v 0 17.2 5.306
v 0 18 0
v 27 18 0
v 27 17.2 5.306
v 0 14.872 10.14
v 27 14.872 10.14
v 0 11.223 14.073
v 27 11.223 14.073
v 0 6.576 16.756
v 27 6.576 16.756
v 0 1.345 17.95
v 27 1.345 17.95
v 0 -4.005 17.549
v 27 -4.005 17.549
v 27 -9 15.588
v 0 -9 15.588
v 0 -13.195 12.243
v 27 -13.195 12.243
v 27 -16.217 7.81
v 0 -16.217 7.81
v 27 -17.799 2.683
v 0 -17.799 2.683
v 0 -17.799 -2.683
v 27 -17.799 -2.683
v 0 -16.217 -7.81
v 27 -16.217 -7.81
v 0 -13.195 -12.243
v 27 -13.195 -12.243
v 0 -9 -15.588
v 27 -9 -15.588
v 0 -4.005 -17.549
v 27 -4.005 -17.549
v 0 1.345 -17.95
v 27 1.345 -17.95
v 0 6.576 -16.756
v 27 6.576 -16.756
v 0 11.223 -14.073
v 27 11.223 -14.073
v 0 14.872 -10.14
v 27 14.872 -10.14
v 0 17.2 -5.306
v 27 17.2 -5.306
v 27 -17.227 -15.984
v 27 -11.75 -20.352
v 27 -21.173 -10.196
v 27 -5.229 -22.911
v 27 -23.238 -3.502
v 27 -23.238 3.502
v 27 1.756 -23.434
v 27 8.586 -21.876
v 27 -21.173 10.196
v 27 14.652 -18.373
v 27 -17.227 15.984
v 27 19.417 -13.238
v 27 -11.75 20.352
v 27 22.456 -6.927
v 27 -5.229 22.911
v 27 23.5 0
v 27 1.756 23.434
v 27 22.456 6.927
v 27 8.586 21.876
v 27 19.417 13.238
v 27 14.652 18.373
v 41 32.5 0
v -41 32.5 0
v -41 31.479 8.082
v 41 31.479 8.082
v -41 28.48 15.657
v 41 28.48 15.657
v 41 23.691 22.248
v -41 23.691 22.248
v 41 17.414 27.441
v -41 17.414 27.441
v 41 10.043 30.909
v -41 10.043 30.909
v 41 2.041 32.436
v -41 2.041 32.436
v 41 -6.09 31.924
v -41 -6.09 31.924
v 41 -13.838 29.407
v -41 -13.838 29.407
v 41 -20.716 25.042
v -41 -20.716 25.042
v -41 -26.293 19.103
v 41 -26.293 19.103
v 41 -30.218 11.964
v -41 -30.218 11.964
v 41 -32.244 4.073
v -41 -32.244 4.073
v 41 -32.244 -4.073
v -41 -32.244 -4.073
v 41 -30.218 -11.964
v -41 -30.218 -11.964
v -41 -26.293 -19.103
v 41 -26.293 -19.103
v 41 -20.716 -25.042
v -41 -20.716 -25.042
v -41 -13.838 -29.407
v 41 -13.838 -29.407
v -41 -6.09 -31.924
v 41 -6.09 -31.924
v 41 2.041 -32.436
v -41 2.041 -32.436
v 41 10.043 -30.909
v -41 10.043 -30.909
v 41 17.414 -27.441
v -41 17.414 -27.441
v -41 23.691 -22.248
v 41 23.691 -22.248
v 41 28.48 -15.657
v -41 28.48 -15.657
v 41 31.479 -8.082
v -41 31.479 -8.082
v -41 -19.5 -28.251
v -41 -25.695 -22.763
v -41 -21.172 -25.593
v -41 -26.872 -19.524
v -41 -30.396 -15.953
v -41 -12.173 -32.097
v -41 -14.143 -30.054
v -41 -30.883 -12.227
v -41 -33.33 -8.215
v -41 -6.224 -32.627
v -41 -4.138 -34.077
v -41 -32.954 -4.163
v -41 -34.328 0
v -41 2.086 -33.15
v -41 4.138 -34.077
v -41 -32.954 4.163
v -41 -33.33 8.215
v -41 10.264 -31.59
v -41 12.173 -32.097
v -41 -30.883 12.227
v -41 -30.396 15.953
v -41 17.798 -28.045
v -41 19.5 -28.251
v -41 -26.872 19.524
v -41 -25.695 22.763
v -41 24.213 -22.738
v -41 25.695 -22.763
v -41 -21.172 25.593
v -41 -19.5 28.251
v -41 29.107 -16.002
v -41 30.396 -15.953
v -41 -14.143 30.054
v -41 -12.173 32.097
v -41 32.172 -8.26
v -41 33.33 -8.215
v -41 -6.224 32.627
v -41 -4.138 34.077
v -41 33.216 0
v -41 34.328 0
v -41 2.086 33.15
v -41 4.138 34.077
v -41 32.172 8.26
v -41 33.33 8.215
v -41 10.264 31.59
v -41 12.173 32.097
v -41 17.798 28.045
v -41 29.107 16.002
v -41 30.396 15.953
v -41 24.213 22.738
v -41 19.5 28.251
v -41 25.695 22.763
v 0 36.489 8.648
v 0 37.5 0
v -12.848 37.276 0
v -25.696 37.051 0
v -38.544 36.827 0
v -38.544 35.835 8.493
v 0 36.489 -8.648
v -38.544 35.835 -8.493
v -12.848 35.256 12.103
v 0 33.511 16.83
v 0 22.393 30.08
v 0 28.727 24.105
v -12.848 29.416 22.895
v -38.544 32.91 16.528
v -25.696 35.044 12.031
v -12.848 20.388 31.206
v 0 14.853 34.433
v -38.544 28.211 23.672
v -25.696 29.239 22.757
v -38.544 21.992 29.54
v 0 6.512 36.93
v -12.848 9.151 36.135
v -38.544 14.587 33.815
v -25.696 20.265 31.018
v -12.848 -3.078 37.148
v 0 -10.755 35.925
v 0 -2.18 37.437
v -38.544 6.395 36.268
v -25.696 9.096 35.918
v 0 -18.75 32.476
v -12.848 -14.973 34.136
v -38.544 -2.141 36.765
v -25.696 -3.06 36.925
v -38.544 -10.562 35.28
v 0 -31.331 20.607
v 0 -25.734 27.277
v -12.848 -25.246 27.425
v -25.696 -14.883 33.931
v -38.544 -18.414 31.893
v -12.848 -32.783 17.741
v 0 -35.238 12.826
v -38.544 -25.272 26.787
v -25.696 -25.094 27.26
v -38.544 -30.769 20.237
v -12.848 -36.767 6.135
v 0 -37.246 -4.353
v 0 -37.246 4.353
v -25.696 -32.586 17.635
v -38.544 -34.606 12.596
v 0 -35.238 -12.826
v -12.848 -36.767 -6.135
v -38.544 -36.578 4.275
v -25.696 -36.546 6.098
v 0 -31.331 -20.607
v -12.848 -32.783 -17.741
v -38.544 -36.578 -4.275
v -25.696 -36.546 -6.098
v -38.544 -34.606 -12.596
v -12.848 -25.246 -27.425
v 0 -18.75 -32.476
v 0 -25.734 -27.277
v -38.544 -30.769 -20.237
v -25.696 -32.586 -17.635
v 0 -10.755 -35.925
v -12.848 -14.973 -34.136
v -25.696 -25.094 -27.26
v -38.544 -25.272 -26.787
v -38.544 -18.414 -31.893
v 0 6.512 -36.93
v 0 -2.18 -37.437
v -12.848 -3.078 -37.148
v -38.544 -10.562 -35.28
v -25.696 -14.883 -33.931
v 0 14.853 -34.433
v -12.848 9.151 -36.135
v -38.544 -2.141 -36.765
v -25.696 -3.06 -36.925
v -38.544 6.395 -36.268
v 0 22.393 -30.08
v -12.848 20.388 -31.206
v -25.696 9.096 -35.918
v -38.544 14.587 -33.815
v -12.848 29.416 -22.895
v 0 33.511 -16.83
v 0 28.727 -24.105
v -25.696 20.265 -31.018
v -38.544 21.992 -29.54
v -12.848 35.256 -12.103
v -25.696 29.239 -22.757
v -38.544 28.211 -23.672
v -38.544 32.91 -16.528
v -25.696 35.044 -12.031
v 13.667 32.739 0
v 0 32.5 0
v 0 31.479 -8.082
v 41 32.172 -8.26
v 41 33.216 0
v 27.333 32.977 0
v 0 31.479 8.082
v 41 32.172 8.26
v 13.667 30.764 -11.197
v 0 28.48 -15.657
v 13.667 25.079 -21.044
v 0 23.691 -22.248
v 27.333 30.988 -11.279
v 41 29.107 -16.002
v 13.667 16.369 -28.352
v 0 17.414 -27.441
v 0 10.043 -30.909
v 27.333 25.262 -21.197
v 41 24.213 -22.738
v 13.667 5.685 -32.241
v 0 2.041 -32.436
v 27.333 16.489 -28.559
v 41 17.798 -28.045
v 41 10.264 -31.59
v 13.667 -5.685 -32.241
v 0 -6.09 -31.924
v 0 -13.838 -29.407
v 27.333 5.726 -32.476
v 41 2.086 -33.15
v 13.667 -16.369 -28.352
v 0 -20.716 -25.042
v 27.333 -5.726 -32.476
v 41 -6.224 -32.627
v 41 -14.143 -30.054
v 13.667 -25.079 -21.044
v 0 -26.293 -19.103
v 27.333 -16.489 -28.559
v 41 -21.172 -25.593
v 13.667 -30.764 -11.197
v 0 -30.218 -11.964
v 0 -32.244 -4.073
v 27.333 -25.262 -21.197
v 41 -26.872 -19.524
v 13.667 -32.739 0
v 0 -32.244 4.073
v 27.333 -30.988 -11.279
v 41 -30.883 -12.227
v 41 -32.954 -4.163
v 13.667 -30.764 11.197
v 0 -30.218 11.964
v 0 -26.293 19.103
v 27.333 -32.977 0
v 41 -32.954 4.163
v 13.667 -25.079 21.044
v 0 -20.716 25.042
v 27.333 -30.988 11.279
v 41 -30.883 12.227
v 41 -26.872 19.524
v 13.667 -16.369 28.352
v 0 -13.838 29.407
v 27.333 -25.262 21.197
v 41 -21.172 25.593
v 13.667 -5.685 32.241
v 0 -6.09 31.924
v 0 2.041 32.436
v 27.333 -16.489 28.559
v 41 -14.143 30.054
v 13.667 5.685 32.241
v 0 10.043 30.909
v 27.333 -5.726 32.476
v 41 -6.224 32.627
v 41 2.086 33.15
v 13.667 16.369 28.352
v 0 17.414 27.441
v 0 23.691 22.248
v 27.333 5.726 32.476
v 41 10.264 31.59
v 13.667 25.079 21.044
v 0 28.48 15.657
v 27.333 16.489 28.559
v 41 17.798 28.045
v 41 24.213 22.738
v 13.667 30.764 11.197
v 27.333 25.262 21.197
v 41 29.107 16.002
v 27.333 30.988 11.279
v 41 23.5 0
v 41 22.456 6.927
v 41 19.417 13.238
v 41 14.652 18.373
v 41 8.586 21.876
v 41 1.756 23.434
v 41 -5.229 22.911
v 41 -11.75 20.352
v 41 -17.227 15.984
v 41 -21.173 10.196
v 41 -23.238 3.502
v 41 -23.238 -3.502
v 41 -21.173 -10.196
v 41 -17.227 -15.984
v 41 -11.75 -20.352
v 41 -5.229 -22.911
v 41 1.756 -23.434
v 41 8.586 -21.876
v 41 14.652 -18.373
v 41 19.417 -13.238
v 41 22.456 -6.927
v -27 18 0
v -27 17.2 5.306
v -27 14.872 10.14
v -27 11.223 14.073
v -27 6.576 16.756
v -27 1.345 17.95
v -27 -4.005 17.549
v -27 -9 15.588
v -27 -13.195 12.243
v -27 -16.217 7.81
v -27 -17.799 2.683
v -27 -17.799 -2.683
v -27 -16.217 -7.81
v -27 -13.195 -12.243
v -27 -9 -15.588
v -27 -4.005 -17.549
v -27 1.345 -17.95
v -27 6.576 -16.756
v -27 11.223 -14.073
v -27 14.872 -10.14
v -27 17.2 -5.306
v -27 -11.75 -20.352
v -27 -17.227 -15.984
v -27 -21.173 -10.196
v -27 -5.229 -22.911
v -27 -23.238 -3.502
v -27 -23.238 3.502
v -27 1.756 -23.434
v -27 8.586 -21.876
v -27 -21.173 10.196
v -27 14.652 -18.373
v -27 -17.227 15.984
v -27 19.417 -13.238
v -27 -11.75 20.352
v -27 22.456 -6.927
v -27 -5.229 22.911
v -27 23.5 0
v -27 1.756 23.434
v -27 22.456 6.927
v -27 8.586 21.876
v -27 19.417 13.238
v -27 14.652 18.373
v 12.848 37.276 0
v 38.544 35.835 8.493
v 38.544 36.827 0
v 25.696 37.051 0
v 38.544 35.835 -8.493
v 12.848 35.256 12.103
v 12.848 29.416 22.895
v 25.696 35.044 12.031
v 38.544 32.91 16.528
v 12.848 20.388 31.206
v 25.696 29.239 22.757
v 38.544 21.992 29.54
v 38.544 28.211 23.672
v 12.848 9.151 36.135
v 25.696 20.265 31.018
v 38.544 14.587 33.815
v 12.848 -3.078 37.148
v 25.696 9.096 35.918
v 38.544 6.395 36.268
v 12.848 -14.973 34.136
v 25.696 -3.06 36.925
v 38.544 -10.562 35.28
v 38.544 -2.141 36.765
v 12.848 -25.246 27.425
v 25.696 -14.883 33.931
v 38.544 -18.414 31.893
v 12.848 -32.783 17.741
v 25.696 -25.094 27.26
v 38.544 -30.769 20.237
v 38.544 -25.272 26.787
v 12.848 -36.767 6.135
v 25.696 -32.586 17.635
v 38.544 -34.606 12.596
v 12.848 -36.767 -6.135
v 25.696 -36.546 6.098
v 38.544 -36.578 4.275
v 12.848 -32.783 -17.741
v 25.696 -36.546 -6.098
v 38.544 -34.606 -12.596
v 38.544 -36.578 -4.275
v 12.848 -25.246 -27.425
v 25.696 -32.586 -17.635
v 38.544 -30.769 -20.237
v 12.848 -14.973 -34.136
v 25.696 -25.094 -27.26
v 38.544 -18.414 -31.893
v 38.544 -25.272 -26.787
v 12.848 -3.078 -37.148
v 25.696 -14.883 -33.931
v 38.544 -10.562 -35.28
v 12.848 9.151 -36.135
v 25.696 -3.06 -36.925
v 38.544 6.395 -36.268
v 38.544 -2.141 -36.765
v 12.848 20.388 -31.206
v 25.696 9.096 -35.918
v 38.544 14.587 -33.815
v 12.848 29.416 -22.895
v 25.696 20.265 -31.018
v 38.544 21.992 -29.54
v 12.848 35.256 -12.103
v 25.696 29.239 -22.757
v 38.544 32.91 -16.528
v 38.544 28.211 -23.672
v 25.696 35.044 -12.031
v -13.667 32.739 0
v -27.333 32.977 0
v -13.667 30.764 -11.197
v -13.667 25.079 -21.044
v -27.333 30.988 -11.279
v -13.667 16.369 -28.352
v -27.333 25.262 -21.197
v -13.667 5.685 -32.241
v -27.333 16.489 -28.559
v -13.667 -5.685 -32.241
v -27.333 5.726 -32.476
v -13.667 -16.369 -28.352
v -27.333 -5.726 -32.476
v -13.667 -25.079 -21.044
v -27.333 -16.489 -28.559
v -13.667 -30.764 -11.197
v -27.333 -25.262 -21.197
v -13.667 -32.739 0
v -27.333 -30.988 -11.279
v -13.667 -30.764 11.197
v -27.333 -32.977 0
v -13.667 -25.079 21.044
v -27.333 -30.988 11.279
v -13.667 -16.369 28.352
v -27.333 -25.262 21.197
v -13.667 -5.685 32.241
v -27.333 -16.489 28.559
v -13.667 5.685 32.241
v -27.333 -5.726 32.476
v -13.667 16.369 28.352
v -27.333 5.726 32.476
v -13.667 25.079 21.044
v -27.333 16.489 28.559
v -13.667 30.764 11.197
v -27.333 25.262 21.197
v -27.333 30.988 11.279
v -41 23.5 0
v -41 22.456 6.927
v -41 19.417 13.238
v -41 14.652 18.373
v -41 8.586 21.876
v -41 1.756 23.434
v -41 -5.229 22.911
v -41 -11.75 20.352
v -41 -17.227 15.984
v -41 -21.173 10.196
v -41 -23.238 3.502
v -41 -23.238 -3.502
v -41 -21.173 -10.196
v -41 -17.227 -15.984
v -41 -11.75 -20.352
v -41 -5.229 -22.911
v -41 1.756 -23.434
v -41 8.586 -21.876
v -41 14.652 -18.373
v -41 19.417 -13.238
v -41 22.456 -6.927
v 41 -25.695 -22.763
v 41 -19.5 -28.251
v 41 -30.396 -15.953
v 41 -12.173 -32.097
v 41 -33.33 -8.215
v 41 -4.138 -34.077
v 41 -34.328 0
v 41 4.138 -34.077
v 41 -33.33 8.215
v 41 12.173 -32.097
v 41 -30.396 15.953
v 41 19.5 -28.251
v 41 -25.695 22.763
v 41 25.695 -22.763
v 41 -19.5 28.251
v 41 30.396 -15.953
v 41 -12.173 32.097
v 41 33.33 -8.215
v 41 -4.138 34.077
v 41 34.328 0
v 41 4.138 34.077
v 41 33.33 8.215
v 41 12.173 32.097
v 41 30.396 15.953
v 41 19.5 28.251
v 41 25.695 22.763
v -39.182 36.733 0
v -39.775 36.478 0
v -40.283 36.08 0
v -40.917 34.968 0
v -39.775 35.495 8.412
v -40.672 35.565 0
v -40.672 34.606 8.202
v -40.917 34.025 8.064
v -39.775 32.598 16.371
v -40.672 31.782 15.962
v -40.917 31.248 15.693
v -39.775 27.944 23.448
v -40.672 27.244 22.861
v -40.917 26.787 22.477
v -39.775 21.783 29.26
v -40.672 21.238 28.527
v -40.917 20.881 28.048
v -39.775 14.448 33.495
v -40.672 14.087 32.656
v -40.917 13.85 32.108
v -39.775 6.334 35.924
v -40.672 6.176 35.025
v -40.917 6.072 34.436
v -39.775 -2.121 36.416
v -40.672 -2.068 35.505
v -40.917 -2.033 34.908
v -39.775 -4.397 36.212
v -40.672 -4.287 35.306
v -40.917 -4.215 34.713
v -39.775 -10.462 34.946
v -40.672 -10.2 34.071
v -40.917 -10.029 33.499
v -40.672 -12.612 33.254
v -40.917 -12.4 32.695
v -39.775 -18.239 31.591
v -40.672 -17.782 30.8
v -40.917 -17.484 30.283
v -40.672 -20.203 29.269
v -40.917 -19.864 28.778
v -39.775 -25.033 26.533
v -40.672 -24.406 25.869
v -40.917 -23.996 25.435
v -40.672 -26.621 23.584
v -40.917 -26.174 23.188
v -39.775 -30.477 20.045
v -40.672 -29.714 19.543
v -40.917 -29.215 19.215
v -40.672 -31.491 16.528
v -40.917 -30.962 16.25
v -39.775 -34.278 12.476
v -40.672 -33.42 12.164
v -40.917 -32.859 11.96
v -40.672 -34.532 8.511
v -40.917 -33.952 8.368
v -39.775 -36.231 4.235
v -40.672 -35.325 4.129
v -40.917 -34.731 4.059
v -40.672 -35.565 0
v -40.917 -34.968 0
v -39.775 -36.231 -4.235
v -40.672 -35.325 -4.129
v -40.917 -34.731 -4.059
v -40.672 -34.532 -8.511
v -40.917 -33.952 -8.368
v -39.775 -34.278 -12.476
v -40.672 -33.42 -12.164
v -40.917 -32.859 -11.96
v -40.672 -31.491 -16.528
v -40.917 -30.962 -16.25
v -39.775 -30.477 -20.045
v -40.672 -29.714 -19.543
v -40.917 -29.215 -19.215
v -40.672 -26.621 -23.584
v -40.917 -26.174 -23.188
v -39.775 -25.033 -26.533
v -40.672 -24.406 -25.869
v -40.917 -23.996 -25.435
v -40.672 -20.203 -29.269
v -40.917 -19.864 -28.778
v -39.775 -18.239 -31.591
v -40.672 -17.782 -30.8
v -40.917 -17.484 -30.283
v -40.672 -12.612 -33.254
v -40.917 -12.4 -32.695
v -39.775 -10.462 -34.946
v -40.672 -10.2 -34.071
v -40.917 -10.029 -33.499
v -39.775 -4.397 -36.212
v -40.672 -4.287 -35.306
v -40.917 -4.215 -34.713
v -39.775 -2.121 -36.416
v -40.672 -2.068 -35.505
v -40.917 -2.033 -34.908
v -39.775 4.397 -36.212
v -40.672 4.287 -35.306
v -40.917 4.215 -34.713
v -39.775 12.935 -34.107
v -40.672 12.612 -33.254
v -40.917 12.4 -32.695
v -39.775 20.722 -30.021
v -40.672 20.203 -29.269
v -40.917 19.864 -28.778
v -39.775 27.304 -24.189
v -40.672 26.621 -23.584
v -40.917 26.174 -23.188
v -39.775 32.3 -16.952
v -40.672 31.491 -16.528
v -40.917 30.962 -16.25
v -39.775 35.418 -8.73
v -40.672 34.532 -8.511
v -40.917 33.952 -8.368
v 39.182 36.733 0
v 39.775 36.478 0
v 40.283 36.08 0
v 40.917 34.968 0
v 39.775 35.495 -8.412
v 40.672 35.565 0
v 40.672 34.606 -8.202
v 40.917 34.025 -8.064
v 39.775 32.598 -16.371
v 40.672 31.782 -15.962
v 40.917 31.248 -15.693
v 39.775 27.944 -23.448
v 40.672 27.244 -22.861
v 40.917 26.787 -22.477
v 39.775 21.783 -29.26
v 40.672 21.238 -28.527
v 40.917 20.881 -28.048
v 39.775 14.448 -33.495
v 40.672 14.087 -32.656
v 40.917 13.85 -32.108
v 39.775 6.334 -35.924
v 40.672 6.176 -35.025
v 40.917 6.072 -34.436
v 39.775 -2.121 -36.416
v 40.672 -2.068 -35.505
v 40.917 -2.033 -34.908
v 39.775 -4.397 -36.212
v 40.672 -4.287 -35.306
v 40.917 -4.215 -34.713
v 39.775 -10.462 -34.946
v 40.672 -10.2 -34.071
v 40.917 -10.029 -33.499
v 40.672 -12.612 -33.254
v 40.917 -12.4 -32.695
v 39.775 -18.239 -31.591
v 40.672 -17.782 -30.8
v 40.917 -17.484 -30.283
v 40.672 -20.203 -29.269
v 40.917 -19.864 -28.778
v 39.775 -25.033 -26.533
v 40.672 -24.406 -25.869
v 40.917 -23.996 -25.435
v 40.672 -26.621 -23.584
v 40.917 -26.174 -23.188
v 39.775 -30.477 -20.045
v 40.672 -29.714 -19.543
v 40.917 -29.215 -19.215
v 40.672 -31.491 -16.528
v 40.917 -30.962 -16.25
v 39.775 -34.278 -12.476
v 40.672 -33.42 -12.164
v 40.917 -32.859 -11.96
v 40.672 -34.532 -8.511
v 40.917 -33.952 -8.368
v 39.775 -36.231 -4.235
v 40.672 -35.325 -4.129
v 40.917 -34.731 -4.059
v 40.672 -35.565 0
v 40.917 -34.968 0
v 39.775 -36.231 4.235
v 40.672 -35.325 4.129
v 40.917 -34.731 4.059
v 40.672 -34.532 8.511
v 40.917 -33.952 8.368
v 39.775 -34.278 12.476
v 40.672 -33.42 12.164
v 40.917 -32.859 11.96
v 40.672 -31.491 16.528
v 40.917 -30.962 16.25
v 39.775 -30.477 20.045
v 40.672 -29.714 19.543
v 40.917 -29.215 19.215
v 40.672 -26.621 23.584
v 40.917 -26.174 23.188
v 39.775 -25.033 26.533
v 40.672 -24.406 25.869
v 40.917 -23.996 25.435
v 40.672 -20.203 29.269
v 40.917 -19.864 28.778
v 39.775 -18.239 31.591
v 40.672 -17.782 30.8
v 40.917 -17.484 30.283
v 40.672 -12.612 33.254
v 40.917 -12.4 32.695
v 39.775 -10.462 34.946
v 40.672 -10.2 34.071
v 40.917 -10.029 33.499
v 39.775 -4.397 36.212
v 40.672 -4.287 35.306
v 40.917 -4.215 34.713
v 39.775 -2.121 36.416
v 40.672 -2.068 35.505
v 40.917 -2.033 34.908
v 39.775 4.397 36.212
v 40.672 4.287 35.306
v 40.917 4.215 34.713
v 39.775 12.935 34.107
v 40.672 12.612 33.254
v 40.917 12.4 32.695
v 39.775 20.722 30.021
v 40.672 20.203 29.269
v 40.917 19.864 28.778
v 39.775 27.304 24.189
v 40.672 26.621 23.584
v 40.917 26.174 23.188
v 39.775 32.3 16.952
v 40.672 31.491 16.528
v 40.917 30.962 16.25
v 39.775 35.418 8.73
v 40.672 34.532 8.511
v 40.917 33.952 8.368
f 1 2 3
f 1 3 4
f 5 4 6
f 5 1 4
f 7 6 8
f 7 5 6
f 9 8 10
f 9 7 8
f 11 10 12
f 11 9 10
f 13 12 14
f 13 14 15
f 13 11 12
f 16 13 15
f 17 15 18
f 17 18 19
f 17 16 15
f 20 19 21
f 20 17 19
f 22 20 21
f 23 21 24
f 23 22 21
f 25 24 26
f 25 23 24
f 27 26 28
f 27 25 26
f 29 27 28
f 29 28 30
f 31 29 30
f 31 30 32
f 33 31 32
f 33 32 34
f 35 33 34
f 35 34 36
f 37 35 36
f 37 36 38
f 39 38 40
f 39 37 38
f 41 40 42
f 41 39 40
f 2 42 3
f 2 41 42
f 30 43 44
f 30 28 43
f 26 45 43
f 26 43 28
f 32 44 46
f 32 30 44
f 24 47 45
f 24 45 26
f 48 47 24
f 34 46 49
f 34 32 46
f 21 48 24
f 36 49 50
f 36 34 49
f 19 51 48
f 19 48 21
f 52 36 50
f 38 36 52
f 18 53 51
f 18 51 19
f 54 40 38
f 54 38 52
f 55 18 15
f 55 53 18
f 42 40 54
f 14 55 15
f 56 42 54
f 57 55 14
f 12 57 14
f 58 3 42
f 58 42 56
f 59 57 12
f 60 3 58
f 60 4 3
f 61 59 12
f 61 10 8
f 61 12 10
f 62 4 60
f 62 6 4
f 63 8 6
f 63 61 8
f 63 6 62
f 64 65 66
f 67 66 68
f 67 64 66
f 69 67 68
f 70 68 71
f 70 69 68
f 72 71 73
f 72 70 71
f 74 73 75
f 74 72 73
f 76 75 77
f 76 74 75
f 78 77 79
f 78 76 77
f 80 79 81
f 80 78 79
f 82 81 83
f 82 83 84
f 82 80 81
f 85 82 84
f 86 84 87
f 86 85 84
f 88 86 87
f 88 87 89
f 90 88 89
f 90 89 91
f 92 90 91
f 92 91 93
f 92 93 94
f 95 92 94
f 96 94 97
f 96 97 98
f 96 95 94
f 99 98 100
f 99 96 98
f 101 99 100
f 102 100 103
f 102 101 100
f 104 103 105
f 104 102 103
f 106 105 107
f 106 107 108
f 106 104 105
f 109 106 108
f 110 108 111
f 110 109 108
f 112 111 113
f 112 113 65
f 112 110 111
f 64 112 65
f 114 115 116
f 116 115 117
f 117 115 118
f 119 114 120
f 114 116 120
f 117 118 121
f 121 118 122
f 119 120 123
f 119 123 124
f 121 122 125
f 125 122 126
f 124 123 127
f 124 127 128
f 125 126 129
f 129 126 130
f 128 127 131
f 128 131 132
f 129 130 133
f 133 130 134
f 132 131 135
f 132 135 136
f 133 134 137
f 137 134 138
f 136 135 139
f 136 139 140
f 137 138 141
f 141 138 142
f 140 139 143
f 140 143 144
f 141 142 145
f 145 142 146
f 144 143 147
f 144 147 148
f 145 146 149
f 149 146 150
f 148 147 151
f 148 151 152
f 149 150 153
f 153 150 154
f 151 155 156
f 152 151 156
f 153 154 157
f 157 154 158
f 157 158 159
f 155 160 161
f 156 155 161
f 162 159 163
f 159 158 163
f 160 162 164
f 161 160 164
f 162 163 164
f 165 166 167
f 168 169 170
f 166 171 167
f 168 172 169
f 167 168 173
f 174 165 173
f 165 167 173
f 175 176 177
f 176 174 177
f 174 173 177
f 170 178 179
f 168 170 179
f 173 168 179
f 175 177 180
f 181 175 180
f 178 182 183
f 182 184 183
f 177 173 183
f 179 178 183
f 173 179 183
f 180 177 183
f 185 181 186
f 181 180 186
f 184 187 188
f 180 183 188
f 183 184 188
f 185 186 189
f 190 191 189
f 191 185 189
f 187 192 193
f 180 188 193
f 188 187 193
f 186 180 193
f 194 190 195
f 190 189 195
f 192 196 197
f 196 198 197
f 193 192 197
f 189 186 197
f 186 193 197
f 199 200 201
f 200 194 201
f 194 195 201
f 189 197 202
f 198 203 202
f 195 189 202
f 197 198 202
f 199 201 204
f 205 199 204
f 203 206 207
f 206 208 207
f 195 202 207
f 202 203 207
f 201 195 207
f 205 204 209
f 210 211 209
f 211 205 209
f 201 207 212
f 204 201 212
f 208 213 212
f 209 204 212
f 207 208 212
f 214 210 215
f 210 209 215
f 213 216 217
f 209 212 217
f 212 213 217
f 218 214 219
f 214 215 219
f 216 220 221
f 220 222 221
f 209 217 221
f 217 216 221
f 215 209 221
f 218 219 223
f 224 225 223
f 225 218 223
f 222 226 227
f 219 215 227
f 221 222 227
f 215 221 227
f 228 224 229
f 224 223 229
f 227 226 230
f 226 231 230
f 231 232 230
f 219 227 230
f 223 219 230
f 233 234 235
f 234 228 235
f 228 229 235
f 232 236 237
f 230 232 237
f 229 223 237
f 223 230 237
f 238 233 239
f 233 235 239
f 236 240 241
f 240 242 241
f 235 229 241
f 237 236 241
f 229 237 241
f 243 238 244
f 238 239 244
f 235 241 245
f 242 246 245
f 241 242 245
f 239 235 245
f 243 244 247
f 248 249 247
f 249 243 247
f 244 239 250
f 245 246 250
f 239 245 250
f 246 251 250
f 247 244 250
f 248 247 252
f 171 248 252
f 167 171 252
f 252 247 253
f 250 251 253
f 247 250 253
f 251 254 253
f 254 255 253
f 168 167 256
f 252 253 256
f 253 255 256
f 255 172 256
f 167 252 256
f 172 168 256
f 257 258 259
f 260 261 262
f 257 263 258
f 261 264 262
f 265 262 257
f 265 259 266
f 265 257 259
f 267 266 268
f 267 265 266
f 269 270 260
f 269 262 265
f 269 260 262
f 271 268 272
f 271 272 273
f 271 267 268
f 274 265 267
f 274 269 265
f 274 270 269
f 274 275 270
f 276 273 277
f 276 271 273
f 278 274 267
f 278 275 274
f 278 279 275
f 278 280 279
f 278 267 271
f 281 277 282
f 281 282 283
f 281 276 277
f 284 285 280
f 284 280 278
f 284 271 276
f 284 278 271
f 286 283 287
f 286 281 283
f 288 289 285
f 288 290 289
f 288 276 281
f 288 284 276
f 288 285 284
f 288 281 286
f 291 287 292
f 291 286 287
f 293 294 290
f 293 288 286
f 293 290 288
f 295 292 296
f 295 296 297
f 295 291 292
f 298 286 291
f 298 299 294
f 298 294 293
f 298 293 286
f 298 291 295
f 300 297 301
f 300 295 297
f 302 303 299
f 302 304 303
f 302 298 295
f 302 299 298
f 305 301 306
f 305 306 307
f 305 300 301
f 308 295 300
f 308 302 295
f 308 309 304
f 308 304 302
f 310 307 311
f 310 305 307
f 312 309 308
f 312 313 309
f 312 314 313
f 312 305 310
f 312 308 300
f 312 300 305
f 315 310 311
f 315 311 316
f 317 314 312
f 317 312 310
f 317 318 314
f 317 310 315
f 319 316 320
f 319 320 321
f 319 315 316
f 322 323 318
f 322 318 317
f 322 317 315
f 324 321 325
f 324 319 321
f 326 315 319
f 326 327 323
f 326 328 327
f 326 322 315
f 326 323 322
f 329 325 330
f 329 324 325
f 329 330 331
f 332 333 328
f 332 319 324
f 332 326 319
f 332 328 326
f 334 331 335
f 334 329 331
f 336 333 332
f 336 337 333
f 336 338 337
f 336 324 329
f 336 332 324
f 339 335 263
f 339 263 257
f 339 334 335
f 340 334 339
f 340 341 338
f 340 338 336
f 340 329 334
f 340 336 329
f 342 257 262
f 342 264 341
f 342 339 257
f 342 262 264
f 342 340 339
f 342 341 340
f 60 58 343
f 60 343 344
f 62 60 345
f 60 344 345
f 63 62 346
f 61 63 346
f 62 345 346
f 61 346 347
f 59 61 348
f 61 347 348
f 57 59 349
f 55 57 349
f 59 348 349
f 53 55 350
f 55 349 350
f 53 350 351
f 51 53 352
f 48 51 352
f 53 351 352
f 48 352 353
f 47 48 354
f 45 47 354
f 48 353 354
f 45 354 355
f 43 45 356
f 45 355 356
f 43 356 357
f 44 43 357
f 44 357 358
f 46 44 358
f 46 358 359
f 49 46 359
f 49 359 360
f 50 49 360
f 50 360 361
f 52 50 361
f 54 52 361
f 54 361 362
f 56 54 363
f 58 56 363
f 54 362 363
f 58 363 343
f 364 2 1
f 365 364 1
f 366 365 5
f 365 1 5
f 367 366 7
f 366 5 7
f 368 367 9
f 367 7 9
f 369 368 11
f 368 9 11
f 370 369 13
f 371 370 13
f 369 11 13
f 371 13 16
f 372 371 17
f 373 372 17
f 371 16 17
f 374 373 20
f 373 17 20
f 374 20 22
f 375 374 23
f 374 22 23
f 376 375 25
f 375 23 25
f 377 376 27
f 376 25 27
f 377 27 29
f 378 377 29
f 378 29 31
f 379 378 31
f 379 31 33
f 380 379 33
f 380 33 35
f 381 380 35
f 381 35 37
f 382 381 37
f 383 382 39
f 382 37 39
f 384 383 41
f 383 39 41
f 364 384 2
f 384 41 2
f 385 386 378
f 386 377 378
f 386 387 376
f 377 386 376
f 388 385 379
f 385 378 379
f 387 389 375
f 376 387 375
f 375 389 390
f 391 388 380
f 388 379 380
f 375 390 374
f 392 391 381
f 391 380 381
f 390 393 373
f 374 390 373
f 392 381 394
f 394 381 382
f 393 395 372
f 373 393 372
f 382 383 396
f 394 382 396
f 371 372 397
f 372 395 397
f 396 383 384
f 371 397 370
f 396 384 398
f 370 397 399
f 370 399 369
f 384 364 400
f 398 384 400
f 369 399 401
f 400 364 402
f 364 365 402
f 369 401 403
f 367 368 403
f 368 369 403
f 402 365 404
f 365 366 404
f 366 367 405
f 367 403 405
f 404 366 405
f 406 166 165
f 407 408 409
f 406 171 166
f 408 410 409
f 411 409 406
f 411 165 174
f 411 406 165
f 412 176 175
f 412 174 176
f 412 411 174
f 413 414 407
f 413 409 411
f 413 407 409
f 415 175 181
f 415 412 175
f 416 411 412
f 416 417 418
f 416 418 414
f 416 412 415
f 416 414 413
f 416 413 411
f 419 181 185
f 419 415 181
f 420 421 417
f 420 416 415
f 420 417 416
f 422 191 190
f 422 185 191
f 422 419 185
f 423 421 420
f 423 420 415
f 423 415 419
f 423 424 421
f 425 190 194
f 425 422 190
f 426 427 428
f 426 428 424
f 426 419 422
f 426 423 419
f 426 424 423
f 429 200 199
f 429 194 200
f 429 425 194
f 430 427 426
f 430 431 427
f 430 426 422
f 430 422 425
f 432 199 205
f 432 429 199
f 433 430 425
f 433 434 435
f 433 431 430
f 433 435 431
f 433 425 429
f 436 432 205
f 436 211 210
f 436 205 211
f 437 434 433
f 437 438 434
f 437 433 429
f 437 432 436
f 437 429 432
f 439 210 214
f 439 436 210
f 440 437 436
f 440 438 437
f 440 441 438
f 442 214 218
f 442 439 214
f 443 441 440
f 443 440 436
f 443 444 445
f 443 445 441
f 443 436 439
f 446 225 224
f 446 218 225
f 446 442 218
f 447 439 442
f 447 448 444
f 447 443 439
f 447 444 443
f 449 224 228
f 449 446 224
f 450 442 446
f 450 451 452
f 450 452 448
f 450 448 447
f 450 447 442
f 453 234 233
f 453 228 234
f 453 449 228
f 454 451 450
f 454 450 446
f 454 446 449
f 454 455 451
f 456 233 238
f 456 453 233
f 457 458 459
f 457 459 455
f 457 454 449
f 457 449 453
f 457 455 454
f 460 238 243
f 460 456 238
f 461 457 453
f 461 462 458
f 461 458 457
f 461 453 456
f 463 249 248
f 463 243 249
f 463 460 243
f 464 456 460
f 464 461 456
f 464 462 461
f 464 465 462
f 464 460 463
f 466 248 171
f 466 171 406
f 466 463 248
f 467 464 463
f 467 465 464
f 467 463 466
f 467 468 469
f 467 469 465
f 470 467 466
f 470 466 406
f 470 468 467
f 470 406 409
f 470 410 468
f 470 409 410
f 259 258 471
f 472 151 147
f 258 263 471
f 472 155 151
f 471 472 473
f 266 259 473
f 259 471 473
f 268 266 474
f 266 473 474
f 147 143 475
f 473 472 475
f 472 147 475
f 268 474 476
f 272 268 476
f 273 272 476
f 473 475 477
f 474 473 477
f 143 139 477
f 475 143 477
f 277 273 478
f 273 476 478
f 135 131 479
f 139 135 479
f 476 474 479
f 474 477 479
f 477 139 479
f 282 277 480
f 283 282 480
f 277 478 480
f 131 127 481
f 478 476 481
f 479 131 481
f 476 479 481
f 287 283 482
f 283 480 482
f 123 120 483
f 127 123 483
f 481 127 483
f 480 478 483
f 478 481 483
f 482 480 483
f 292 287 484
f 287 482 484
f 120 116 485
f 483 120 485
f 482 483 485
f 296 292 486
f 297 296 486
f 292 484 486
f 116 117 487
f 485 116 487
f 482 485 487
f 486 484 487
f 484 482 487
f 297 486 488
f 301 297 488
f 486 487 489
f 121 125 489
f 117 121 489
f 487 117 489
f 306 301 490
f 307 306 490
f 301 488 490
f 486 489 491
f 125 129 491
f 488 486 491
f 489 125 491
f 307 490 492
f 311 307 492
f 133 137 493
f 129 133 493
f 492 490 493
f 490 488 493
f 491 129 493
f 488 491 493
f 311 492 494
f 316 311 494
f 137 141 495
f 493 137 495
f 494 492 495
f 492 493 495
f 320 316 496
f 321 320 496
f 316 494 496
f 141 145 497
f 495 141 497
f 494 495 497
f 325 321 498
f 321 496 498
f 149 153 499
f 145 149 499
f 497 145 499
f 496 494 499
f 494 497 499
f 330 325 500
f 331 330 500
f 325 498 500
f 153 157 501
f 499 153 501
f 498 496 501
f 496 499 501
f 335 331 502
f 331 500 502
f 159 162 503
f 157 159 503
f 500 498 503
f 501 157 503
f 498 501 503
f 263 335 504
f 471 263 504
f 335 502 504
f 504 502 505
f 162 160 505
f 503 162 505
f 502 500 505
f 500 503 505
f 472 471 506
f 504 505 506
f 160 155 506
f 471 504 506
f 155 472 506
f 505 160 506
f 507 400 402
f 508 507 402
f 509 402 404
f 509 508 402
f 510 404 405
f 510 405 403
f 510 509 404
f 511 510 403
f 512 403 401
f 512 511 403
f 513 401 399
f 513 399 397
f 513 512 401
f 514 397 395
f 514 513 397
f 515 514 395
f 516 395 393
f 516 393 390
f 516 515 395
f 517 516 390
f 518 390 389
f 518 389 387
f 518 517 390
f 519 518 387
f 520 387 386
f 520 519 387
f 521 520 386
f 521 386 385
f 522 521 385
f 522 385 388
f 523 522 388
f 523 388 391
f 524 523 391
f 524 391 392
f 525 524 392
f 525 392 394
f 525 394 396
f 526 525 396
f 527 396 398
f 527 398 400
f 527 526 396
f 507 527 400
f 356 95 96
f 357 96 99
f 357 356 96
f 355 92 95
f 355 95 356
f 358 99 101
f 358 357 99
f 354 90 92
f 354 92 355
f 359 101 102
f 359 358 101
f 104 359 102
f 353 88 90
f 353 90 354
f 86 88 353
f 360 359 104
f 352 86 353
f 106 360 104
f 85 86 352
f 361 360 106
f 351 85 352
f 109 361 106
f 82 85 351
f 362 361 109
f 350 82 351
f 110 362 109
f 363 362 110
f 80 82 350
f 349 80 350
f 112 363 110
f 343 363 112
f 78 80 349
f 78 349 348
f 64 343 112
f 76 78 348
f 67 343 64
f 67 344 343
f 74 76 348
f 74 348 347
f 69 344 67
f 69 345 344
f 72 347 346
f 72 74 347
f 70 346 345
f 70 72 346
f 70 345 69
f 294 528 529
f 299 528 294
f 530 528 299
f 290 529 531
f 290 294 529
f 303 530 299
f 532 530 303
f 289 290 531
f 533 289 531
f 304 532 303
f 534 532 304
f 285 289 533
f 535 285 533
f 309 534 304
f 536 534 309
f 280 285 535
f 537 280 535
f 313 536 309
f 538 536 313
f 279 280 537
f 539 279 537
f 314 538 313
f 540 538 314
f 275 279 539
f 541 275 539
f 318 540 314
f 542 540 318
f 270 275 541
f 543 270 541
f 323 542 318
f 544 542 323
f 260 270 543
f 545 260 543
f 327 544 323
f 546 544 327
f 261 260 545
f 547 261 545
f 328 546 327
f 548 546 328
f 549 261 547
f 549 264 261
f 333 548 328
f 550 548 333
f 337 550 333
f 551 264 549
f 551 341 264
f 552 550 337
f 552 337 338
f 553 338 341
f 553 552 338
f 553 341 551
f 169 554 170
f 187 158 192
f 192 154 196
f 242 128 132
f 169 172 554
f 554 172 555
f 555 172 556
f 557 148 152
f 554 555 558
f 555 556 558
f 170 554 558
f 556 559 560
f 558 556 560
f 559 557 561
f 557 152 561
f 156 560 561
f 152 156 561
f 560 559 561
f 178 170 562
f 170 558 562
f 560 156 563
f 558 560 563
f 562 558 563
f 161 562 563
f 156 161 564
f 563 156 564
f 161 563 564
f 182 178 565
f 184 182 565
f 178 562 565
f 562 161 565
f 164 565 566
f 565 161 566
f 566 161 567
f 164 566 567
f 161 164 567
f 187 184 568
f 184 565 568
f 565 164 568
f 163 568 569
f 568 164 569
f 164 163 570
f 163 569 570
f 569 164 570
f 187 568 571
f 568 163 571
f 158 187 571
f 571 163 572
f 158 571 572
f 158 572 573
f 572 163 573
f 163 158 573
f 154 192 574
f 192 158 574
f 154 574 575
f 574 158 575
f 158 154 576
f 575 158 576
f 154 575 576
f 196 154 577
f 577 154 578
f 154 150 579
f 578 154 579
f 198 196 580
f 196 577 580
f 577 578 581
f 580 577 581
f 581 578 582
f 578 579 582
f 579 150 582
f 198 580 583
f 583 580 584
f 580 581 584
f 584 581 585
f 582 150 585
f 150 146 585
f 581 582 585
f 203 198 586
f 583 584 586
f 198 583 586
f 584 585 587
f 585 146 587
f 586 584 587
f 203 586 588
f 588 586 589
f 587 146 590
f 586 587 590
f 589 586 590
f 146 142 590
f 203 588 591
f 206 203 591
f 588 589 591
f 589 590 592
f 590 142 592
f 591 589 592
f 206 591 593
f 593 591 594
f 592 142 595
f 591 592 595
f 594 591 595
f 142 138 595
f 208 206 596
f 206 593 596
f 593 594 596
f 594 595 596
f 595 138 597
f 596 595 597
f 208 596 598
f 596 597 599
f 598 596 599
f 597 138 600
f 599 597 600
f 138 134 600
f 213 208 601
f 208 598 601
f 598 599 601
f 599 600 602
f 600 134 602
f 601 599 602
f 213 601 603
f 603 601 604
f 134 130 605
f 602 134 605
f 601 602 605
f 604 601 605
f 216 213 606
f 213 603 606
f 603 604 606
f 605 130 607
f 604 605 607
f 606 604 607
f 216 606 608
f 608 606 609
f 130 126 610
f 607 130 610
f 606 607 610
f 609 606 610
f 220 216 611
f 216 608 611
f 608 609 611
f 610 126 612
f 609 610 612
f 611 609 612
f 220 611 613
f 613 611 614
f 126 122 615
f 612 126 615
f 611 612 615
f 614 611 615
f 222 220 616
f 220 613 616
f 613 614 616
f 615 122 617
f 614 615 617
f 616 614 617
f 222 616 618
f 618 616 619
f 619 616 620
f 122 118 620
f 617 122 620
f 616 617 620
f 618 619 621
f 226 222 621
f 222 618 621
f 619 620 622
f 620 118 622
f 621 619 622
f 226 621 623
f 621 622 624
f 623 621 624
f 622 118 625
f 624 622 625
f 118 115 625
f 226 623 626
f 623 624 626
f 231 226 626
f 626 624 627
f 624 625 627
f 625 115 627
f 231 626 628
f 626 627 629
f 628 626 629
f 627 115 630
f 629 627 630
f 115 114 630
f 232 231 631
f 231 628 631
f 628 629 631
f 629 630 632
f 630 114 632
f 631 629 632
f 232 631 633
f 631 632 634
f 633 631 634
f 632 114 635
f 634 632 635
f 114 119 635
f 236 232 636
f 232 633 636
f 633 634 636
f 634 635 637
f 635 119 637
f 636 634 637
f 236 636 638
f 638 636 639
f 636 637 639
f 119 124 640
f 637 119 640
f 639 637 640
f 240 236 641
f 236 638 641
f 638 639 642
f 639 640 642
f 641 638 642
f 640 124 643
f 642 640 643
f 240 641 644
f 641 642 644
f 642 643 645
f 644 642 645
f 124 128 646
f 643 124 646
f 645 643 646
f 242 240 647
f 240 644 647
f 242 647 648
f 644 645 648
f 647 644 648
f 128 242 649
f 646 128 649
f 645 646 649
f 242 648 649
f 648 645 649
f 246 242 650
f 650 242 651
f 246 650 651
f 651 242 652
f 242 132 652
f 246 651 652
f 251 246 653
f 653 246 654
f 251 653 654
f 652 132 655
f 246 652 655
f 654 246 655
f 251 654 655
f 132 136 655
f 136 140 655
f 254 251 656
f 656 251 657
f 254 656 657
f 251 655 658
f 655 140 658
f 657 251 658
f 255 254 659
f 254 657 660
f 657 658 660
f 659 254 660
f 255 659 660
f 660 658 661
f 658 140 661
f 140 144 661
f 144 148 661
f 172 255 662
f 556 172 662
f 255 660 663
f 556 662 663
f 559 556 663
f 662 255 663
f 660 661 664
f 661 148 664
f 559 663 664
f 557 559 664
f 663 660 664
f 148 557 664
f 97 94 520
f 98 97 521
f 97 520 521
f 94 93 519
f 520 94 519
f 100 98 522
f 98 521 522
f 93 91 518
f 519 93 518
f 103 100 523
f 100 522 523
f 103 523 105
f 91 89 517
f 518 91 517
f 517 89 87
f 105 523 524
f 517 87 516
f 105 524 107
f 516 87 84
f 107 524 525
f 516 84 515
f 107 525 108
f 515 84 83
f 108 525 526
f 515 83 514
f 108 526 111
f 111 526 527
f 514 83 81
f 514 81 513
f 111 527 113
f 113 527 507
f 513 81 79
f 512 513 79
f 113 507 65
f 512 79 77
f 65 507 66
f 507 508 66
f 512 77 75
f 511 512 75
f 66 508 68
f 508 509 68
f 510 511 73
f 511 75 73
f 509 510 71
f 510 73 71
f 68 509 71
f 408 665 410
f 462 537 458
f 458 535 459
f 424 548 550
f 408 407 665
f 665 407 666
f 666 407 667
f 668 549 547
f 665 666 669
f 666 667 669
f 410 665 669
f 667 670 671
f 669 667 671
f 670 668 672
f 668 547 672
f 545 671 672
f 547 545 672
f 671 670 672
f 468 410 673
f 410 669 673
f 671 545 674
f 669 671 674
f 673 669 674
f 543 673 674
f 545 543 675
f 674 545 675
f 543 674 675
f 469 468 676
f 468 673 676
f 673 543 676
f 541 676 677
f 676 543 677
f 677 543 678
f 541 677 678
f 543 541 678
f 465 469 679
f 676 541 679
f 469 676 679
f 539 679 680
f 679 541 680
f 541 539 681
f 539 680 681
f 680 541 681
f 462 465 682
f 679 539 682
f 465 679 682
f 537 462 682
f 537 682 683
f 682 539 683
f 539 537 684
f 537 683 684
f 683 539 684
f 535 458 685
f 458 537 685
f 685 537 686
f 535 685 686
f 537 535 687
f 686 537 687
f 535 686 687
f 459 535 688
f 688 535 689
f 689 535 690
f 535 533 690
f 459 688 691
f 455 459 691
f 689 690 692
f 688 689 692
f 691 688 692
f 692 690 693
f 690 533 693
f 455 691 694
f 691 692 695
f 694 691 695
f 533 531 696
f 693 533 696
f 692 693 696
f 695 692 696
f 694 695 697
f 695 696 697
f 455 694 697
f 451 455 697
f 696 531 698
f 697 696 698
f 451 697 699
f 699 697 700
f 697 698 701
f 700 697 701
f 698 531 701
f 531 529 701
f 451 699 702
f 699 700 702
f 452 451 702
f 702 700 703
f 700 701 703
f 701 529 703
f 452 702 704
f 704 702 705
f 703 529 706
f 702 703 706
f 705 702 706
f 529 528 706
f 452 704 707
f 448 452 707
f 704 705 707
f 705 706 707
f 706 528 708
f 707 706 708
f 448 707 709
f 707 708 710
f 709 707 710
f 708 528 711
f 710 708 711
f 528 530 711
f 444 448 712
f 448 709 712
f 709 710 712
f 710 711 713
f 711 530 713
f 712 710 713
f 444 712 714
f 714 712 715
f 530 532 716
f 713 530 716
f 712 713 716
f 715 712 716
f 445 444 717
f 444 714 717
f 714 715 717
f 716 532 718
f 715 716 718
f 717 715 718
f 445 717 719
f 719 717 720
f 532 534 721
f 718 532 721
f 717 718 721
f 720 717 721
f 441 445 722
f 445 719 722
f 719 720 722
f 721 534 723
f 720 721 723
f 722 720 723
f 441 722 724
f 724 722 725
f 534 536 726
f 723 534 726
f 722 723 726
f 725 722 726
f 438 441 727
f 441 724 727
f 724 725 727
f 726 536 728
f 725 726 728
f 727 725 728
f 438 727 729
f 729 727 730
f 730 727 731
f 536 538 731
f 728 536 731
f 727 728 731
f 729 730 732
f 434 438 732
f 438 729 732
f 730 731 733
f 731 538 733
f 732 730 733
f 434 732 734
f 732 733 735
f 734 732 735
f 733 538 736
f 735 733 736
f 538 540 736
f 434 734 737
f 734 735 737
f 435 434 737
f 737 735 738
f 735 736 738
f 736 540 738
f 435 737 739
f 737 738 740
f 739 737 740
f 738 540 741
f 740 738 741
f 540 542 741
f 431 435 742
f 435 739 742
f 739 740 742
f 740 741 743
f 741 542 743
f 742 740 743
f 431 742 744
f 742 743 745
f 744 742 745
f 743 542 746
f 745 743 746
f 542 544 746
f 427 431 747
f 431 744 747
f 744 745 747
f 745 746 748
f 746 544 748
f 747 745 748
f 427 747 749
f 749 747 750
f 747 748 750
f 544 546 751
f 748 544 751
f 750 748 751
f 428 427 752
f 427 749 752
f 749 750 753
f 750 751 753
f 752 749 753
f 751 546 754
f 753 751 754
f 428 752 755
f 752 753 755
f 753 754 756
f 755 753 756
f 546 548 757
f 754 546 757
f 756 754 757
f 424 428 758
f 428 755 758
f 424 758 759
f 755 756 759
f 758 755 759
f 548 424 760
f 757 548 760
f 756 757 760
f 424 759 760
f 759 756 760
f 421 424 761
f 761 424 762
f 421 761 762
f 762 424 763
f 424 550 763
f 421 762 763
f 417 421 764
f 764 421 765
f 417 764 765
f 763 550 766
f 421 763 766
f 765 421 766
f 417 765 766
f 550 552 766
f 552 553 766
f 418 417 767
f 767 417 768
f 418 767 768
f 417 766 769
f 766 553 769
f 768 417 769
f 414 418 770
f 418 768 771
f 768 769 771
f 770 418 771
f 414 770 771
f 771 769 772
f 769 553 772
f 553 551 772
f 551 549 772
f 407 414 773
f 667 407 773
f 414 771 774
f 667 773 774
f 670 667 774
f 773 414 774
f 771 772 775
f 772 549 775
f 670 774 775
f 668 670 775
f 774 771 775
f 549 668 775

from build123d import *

# Parameters (mm, degrees)
F0_R          = 37.5
F0_R_2        = 32.5
F1_DEPTH      = 41
F1_TAPER      = 1
F2_R          = 2.5
F3_DEPTH      = 41
F4_R          = 23.5
F5_DEPTH      = 14
F7_R          = 18
F8_DEPTH      = 27
F8_DEPTH_BACK = 27


with BuildPart() as f1:
    # F0 (on Right) → F1 (new body, symmetric)
    with BuildSketch(Plane.YZ):
        Circle(F0_R)
        Circle(F0_R_2, mode=Mode.SUBTRACT)
    extrude(amount=F1_DEPTH, both=True, taper=F1_TAPER)

    # F2
    f2_edges = [f1.edges().sort_by_distance(p)[0] for p in [
        (41, -36.784342, 0),
        (-41, -36.784342, 0),
    ]]
    fillet(f2_edges, radius=F2_R)


with BuildPart() as f3:
    # F0 (on Right) → F3 (new body, symmetric)
    with BuildSketch(Plane.YZ):
        Circle(F0_R_2)
    extrude(amount=F3_DEPTH, both=True)

    # F4 (on face) → F5 (cut)
    with BuildSketch(Plane.YZ.offset(41)):
        Circle(F4_R)
    f5 = extrude(amount=-F5_DEPTH, mode=Mode.SUBTRACT)

    # F6: F5 across plane
    add(f5.mirror(Plane.YZ), mode=Mode.SUBTRACT)

    # F7 (on Right) → F8 (cut, two sides)
    with BuildSketch(Plane.YZ) as f8_sk:
        Circle(F7_R)
    extrude(amount=-F8_DEPTH, mode=Mode.SUBTRACT)
    extrude(f8_sk.sketch, amount=F8_DEPTH_BACK, mode=Mode.SUBTRACT)


solid = Compound([f1.part, f3.part])
